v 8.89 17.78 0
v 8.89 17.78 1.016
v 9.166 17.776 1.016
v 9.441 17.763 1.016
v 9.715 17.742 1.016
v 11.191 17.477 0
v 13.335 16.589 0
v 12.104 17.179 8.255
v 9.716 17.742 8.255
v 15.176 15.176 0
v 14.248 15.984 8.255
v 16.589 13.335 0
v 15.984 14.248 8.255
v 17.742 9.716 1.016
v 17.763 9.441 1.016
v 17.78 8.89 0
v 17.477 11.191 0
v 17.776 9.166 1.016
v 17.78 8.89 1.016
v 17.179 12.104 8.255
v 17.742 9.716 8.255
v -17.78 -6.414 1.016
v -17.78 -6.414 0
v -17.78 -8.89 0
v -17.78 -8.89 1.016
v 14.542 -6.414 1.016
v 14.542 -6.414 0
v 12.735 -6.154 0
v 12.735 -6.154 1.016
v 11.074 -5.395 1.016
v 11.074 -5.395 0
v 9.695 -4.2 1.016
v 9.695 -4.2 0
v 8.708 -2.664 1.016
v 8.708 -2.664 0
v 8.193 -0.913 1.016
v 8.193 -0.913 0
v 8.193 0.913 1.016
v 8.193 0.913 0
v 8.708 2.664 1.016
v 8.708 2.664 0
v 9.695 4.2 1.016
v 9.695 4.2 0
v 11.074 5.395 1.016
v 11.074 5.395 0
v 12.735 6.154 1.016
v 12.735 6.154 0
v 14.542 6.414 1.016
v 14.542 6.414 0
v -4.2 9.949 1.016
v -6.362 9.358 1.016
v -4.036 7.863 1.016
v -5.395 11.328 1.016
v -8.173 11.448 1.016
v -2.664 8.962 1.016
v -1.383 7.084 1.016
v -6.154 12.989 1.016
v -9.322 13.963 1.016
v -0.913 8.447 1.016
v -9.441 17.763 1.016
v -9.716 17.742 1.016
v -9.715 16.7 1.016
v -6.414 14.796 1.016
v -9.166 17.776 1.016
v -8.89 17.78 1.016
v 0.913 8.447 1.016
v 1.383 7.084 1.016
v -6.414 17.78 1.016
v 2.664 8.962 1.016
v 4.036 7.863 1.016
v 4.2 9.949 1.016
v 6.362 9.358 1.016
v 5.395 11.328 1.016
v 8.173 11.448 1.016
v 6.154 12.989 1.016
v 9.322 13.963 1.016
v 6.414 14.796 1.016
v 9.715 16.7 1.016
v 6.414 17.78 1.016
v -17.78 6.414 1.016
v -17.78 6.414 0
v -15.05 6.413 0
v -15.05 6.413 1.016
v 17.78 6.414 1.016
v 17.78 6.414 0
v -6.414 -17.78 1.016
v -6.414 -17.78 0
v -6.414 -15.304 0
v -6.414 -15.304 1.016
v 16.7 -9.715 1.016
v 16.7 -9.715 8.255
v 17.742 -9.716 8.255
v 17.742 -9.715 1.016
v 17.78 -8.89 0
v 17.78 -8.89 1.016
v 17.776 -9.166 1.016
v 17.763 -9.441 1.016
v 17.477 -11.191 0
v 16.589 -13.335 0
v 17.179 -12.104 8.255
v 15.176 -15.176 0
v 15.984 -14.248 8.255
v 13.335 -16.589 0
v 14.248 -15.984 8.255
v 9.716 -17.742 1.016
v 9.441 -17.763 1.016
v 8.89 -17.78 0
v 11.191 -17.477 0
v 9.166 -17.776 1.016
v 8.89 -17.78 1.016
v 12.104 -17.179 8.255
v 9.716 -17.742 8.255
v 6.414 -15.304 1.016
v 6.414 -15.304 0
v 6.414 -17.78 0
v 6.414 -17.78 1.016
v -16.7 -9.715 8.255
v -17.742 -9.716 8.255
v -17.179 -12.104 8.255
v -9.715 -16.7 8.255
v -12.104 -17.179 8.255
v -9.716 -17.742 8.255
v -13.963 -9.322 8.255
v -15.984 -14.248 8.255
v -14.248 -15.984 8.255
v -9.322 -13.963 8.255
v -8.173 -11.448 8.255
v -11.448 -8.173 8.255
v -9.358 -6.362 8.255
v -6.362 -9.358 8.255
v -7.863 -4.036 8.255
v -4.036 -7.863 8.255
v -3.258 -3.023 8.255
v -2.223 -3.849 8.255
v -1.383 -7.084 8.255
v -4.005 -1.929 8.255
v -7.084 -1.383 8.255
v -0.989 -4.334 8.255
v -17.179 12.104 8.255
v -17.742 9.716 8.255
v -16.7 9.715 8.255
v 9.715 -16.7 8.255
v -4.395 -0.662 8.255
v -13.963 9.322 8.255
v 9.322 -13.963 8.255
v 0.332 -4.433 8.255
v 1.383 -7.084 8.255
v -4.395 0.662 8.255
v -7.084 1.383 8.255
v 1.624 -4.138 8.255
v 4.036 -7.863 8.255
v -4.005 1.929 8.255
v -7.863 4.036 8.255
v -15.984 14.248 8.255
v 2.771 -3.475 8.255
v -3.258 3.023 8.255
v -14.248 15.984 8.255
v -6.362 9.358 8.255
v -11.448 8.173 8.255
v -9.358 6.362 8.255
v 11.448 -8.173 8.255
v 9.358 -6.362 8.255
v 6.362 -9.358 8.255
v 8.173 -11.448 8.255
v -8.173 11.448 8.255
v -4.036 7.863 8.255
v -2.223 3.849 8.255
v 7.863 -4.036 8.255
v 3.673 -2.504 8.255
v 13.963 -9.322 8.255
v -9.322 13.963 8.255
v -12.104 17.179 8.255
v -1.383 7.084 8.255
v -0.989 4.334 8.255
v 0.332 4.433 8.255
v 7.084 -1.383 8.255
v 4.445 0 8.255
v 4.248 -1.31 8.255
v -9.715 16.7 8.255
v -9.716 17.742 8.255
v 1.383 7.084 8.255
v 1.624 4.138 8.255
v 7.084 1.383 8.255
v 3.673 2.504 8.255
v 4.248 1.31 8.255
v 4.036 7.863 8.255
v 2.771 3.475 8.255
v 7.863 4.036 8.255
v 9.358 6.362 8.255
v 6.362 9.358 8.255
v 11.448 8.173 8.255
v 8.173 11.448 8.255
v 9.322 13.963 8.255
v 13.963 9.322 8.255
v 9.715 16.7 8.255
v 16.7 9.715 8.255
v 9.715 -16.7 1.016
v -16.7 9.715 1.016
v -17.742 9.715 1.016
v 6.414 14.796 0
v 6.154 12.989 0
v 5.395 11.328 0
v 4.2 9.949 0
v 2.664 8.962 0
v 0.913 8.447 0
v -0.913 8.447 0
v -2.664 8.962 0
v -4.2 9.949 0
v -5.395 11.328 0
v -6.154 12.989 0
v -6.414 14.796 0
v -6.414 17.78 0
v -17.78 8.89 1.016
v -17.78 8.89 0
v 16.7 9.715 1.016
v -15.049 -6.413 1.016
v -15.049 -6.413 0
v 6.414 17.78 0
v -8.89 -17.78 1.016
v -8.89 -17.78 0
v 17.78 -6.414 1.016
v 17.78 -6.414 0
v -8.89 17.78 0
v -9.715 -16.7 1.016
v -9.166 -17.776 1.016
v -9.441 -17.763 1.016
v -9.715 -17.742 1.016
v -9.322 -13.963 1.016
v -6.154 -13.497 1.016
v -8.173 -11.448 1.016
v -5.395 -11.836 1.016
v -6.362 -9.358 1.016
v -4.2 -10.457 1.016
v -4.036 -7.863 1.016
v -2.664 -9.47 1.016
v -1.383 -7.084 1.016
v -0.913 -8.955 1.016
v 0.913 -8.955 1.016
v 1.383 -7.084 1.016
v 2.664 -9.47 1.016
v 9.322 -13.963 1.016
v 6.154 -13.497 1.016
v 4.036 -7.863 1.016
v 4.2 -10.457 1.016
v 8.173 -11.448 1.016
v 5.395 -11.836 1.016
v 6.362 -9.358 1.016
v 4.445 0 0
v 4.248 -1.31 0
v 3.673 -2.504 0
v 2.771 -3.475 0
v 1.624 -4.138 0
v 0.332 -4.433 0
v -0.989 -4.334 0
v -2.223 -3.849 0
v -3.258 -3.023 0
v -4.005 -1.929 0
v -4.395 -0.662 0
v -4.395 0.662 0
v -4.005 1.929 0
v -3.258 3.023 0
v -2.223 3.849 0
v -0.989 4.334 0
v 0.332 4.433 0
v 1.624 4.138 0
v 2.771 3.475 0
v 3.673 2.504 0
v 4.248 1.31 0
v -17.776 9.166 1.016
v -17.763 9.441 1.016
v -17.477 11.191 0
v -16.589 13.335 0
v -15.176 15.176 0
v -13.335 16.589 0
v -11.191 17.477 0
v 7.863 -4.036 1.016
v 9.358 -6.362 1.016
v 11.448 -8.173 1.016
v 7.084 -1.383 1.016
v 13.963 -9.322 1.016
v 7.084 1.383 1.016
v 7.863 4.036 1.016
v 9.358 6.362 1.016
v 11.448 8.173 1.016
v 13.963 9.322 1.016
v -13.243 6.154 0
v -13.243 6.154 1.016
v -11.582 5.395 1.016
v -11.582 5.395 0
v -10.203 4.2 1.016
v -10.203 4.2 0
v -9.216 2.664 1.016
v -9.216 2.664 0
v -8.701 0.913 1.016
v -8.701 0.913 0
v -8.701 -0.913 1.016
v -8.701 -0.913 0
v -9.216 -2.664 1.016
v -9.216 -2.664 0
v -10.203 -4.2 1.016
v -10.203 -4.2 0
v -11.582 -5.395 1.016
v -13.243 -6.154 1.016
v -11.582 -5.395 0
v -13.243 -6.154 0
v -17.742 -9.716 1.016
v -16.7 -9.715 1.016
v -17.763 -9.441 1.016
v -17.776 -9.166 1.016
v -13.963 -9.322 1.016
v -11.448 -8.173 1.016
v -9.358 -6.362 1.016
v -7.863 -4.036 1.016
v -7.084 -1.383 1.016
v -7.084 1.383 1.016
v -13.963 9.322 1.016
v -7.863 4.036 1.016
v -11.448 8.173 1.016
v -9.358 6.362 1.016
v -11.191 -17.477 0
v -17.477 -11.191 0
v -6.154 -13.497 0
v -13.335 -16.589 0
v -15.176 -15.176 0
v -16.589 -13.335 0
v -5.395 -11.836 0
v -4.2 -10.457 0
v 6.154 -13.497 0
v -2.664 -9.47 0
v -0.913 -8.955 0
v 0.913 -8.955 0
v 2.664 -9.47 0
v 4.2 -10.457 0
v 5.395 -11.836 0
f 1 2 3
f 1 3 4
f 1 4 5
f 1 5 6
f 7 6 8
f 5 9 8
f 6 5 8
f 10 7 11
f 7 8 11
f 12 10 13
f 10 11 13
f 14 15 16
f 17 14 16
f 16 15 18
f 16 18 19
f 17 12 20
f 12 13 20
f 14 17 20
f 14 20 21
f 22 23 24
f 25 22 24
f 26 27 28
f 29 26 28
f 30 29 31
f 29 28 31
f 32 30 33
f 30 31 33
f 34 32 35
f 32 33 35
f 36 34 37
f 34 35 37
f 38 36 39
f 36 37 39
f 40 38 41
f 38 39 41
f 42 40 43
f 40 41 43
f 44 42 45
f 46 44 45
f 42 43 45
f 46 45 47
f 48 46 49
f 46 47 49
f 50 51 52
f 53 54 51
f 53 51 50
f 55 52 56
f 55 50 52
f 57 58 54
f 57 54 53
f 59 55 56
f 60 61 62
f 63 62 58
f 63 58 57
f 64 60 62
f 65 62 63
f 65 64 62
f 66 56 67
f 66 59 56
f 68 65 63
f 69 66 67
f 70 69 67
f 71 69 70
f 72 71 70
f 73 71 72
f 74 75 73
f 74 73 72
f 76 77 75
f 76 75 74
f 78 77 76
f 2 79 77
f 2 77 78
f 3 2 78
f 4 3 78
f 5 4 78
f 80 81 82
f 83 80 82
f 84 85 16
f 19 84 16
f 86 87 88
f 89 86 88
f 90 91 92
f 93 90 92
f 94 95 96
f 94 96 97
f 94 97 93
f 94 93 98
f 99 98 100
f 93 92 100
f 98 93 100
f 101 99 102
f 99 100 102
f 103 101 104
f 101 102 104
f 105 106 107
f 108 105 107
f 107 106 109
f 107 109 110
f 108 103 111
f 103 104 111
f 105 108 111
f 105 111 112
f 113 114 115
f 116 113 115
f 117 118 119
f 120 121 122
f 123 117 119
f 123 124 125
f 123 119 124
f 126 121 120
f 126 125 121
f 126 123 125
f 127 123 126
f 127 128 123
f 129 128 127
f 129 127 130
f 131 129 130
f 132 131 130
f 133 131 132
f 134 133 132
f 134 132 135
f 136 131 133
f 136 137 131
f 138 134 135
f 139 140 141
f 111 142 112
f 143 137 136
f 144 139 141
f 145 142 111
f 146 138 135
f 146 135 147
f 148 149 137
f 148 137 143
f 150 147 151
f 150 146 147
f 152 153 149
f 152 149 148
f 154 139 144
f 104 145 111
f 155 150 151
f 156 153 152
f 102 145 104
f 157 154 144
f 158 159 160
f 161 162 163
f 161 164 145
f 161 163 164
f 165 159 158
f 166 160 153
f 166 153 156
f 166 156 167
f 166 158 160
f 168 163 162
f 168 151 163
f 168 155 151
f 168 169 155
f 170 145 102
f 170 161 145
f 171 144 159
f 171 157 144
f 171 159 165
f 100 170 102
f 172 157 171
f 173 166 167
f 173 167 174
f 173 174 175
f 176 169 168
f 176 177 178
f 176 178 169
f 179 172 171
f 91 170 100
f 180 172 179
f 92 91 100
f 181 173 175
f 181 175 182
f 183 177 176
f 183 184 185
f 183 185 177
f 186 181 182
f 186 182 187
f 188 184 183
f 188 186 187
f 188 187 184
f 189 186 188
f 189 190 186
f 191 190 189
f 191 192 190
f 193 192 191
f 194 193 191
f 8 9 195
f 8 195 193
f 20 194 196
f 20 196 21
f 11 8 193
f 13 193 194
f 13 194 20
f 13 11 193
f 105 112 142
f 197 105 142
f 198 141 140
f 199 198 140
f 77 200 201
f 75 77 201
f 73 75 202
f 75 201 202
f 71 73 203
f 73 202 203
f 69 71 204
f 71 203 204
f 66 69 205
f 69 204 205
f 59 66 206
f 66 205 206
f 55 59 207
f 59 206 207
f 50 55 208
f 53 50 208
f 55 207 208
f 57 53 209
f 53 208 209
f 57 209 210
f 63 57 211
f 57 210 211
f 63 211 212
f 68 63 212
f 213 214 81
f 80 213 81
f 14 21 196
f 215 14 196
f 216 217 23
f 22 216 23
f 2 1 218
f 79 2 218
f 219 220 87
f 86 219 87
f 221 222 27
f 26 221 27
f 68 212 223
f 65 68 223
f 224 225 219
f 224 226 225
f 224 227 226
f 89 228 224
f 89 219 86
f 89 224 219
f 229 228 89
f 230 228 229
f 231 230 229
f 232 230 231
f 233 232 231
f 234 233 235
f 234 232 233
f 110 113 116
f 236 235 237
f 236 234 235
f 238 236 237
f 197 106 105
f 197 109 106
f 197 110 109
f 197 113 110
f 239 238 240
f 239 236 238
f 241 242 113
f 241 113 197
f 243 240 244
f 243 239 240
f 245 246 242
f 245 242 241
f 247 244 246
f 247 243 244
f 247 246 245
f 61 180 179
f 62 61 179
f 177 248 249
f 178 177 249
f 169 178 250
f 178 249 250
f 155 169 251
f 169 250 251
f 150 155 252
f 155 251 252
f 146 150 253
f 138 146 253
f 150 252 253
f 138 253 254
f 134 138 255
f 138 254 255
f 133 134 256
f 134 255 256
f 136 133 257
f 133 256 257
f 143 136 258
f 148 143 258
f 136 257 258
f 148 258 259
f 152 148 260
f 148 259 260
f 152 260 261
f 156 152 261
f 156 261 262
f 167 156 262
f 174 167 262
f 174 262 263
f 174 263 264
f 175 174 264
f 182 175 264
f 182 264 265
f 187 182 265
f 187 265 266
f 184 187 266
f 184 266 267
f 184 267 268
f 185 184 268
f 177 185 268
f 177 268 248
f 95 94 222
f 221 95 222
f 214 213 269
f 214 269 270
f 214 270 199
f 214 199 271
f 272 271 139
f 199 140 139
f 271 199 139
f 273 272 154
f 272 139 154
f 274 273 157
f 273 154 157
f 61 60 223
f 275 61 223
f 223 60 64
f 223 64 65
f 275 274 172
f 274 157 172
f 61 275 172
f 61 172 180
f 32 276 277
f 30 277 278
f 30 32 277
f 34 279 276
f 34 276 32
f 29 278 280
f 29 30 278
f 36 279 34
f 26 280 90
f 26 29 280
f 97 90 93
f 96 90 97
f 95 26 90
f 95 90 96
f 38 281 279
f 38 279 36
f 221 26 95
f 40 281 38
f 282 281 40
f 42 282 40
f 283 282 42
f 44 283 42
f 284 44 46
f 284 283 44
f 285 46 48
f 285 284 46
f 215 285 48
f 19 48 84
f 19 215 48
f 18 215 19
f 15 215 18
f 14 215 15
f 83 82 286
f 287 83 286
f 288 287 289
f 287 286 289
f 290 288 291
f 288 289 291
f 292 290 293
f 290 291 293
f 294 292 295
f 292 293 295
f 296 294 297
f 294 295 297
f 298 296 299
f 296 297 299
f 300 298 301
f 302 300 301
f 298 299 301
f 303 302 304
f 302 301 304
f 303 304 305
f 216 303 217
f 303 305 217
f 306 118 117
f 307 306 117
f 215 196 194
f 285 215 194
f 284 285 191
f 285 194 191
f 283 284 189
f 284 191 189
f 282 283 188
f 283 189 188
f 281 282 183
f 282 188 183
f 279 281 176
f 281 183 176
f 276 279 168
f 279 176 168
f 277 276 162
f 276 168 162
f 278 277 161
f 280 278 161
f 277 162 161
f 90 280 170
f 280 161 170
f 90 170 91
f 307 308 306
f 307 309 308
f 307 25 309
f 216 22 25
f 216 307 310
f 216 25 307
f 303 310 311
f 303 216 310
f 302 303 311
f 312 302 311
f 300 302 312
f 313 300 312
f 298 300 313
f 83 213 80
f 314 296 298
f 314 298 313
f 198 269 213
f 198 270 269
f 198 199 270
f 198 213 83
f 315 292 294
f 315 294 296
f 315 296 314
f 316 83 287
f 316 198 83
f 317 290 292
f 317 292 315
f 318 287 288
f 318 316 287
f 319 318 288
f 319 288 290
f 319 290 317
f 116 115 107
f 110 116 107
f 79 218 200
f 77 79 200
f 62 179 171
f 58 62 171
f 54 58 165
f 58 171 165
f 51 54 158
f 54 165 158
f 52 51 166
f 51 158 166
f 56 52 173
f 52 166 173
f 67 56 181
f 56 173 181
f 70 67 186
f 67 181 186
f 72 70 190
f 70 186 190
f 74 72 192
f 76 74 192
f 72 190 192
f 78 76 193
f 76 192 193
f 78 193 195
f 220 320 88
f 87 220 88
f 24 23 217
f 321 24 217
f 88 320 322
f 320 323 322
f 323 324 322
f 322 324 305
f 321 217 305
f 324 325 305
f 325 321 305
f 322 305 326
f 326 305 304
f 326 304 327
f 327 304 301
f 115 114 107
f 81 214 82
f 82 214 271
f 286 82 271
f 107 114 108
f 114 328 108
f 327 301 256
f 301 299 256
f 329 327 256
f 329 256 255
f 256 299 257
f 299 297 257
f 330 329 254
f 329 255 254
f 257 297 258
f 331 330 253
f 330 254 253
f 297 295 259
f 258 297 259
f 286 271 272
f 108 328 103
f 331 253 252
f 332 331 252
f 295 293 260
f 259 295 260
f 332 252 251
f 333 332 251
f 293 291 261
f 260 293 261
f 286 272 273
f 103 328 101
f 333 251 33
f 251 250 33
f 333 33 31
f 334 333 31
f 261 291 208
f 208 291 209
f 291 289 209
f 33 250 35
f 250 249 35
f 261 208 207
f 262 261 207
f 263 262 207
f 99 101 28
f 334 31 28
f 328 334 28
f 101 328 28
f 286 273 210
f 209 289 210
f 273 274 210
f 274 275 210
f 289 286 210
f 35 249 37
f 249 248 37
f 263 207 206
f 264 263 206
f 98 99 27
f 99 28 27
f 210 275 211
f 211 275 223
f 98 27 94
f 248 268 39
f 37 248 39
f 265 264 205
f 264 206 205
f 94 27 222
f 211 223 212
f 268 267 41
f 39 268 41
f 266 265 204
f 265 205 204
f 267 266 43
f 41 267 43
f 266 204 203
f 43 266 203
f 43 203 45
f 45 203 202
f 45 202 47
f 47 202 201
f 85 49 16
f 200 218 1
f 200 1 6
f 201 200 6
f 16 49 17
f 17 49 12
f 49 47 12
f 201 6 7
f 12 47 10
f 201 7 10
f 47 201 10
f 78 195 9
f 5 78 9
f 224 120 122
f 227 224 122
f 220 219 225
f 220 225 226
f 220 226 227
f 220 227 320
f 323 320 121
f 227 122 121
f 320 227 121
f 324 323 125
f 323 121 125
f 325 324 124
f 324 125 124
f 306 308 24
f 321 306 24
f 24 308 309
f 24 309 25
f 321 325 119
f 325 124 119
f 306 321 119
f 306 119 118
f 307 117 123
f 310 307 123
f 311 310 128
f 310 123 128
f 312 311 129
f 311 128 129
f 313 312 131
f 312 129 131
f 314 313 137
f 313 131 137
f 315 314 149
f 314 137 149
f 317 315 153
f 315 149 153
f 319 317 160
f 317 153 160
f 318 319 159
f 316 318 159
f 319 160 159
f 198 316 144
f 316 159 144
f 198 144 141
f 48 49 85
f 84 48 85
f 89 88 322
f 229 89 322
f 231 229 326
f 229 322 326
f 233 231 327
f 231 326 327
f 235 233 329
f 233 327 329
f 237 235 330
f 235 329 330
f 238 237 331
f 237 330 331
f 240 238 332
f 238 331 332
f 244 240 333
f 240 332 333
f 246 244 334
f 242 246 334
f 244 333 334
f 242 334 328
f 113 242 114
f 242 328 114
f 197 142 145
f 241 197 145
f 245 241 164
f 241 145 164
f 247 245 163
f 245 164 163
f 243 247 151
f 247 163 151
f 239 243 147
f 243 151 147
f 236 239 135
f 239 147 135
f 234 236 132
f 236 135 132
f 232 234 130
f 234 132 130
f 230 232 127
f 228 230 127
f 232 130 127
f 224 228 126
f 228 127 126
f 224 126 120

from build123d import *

# Parameters (mm, degrees)
F1_DEPTH = 8.255
F3_DEPTH = 7.239
F5_DEPTH = 25.4
F6_R     = 8.89
F7_R     = 4.445
F8_DEPTH = 25.4


with BuildPart() as f1:
    # F0 (on Top) → F1 (new body)
    with BuildSketch(Plane.XY):
        Polygon((8.144473, -17.78), (17.78, -17.78), (17.78, 17.78), (-17.78, 17.78), (-17.78, -17.78), (-8.144473, -17.78), align=None)
    extrude(amount=F1_DEPTH)

    # F2 (on face) → F3 (cut)
    with BuildSketch(Plane.XY.offset(8.255)):
        with BuildLine():
            Line((-9.7155, 17.78), (-9.7155, 16.7005))
            ThreePointArc((-9.7155, 16.7005), (0, 6.985), (9.7155, 16.7005))
            Line((9.7155, 16.7005), (9.7155, 17.78))
            Line((9.7155, 17.78), (-9.7155, 17.78))
        make_face()
        with BuildLine():
            Line((17.78, 9.7155), (16.7005, 9.7155))
            ThreePointArc((16.7005, 9.7155), (6.985, 0), (16.7005, -9.7155))
            Line((16.7005, -9.7155), (17.78, -9.7155))
            Line((17.78, -9.7155), (17.78, 9.7155))
        make_face()
        with BuildLine():
            Line((-17.78, -9.7155), (-16.7005, -9.7155))
            ThreePointArc((-16.7005, -9.7155), (-6.985, 0), (-16.7005, 9.7155))
            Line((-16.7005, 9.7155), (-17.78, 9.7155))
            Line((-17.78, 9.7155), (-17.78, -9.7155))
        make_face()
        with BuildLine():
            Line((9.7155, -17.78), (9.7155, -16.7005))
            ThreePointArc((9.7155, -16.7005), (0, -6.985), (-9.7155, -16.7005))
            Line((-9.7155, -16.7005), (-9.7155, -17.78))
            Line((-9.7155, -17.78), (9.7155, -17.78))
        make_face()
    extrude(amount=-F3_DEPTH, mode=Mode.SUBTRACT)

    # F4 (on face) → F5 (cut)
    with BuildSketch(Plane(origin=(0, 0, 0), x_dir=(1, 0, 0), z_dir=(0, 0, -1))):
        with BuildLine():
            Line((-6.4135, 17.78), (-6.4135, 15.3035))
            ThreePointArc((-6.4135, 15.3035), (0, 8.89), (6.4135, 15.3035))
            Line((6.4135, 15.3035), (6.4135, 17.78))
            Line((6.4135, 17.78), (-6.4135, 17.78))
        make_face()
        with BuildLine():
            Line((17.78, 6.4135), (14.5415, 6.4135))
            ThreePointArc((14.5415, 6.4135), (8.128, 0), (14.5415, -6.4135))
            Line((14.5415, -6.4135), (17.78, -6.4135))
            Line((17.78, -6.4135), (17.78, 6.4135))
        make_face()
        with BuildLine():
            Line((-17.78, -6.4135), (-15.0495, -6.4135))
            ThreePointArc((-15.0495, -6.4135), (-8.636, 0), (-15.0495, 6.4135))
            Line((-15.0495, 6.4135), (-17.78, 6.4135))
            Line((-17.78, 6.4135), (-17.78, -6.4135))
        make_face()
        with BuildLine():
            Line((6.4135, -17.78), (6.4135, -14.7955))
            ThreePointArc((6.4135, -14.7955), (0, -8.382), (-6.4135, -14.7955))
            Line((-6.4135, -14.7955), (-6.4135, -17.78))
            Line((-6.4135, -17.78), (6.4135, -17.78))
        make_face()
    extrude(amount=-F5_DEPTH, mode=Mode.SUBTRACT)

    # F6
    f6_edges = [f1.edges().sort_by_distance(p)[0] for p in [
        (-17.78, 17.78, 4.1275),
        (-17.78, -17.78, 4.1275),
        (17.78, -17.78, 4.1275),
        (17.78, 17.78, 4.1275),
    ]]
    fillet(f6_edges, radius=F6_R)

    # F7 (on face) → F8 (cut)
    with BuildSketch(Plane(origin=(0, 0, 0), x_dir=(1, 0, 0), z_dir=(0, 0, -1))):
        Circle(F7_R)
    extrude(amount=-F8_DEPTH, mode=Mode.SUBTRACT)


solid = f1.part
